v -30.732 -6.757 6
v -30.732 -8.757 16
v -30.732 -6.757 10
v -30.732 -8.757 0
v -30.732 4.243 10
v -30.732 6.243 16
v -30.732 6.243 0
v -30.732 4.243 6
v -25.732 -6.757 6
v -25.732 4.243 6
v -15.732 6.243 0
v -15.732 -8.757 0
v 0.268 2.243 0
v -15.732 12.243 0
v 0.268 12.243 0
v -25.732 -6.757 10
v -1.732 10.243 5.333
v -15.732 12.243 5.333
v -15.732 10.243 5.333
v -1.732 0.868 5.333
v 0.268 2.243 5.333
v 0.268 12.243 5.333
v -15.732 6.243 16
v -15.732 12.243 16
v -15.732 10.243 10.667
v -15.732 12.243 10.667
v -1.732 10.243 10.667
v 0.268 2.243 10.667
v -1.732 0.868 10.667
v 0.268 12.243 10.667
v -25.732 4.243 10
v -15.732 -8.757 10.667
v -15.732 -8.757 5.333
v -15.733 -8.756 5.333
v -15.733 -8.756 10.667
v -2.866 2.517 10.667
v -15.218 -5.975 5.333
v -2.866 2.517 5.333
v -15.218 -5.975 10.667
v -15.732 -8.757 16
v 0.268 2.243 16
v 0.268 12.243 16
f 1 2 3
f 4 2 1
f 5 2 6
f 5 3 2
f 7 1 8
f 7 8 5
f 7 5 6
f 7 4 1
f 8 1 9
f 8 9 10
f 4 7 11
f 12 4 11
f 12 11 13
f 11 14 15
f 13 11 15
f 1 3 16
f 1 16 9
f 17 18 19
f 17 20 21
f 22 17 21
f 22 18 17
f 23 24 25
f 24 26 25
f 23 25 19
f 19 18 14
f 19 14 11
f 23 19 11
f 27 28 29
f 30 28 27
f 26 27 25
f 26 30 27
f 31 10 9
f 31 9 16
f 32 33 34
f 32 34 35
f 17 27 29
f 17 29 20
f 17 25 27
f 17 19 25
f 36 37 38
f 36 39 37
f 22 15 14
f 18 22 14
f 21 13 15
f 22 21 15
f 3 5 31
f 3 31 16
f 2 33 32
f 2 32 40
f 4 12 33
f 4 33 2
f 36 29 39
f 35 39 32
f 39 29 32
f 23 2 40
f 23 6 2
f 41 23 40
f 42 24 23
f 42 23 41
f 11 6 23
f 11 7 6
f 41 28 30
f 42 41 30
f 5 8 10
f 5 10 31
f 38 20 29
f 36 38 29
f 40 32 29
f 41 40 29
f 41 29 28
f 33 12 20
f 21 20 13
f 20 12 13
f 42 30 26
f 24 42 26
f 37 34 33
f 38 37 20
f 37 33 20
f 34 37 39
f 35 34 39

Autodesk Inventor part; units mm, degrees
ref_plane "YZ Plane" through (0, 0, 0) normal (1, 0, 0) x (0, 1, 0)
ref_plane "XZ Plane" through (0, 0, 0) normal (0, 1, 0) x (-1, 0, 0)
ref_plane "XY Plane" through (0, 0, 0) normal (0, 0, 1) x (1, 0, 0)
sketch "Sketch1" plane through (0, 0, 0) normal (0, 0, 1) x (1, 0, 0)
  line L0 (-30.7315, 6.2426) -> (-15.7315, 6.2426)
  line L1 (-15.7315, 6.2426) -> (-15.7315, -8.7574)
  line L2 (-15.7315, -8.7574) -> (-30.7315, -8.7574)
  line L3 (-30.7315, -8.7574) -> (-30.7315, 6.2426)
  line L4 (0.2685, 2.2426) -> (0.2685, 12.2426)
  line L5 (0.2685, 12.2426) -> (-15.7315, 12.2426)
  line L6 (-15.7315, 12.2426) -> (-15.7315, 6.2426)
  line L7 (-15.7315, -8.7574) -> (0.2685, 2.2426)
  point P0 (0, 0)
  dimension "d0" = 15
  dimension "d1" = 15
  dimension "d2" = 6
  dimension "d3" = 16
  dimension "d4" = 10
extrude "Extrusion1" add sketch "Sketch1" along normal blind 16
sketch "Sketch2" plane through (-15.7315, 12.2426, 0) normal (0, 1, 0) x (1, 0, 0)
  line L0 (16, 0) -> (16, -16) projected
  line L1 (0, -5.3333) -> (16, -5.3333)
  line L2 (16, -5.3333) -> (16, -10.6667)
  line L3 (16, -10.6667) -> (0, -10.6667)
  line L4 (0, -10.6667) -> (0, -5.3333)
  line L5 (0, 0) -> (0, -16) projected
  line L6 (16, 0) -> (0, 0) projected
  line L7 (16, -16) -> (0, -16) projected
  point P0 (15.7315, 0)
  dimension "d7" = 16
  dimension "d8" = 5.3333
  dimension "d9" = 5.3333
extrude "Extrusion2" cut sketch "Sketch2" against normal blind 2 contours L0 L3 L4 L1
sketch "Sketch3" plane through (0.2685, 2.2426, 0) normal (1, 0, 0) x (0, 0, -1)
  line L0 (-10.6667, 8) -> (-10.6667, 10) projected
  line L1 (-10.6667, 10) -> (-16, 10) projected
  line L2 (-16, 0) -> (-16, 10) projected
  line L3 (0, 0) -> (-16, 0) projected
  line L4 (0, 0) -> (0, 10) projected
  line L5 (0, 10) -> (-5.3333, 10) projected
  line L6 (-5.3333, 10) -> (-5.3333, 8) projected
  line L7 (-5.3333, 8) -> (-10.6667, 8) projected
  line L8 (0, 0) -> (-16, 0) projected
  line L9 (-10.6667, 8) -> (-5.3333, 8)
  line L10 (-10.6667, 8) -> (-10.6667, -2)
  line L11 (-10.6667, -2) -> (-5.3333, -2)
  line L12 (-5.3333, -2) -> (-5.3333, 8)
  point P0 (0, -2.2426)
  dimension "d14" = 10
  dimension "d15" = 10
extrude "Extrusion3" cut sketch "Sketch3" against normal blind 2 contours L7 L12 L3 L10 | L3 L12 L11 L10
sketch "Sketch4" plane through (-15.7315, -8.7574, 0) normal (0.5665, -0.824, 0) x (0.824, 0.5665, 0)
  line L0 (16.9894, 10.6667) -> (19.4165, 10.6667) projected
  line L1 (19.4165, 10.6667) -> (19.4165, 16) projected
  line L2 (0, 16) -> (19.4165, 16) projected
  line L3 (0, 0) -> (0, 16) projected
  line L4 (0, 0) -> (19.4165, 0) projected
  line L5 (19.4165, 0) -> (19.4165, 5.3333) projected
  line L6 (19.4165, 5.3333) -> (16.9894, 5.3333) projected
  line L7 (16.9894, 5.3333) -> (16.9894, 10.6667) projected
  line L8 (16.9894, 10.6667) -> (19.4165, 10.6667) projected
  line L9 (16.9894, 10.6667) -> (0, 10.6667)
  line L10 (0, 10.6667) -> (0, 5.3333)
  line L11 (0, 5.3333) -> (16.9894, 5.3333)
  line L12 (16.9894, 5.3333) -> (16.9894, 10.6667)
  point P0 (17.9247, 0)
  dimension "d17" = 19.4165
extrude "Extrusion4" cut sketch "Sketch4" against normal blind 2 contours L7 L11 L3 L9
chamfer "Chamfer1" distance 2 angle 45 1 edges at (-16.8645, -7.1093, 8)
sketch "Sketch5" plane through (-30.7315, -8.7574, 0) normal (-1, 0, 0) x (0, 0, 1)
  line L0 (6, 13) -> (10, 13)
  line L1 (10, 13) -> (10, 2)
  line L2 (10, 2) -> (6, 2)
  line L3 (6, 2) -> (6, 13)
  line L4 (0, 15) -> (0, 0) projected
  line L5 (0, 0) -> (16, 0) projected
  line L6 (16, 15) -> (16, 0) projected
  line L7 (0, 15) -> (16, 15) projected
  point P0 (0, 8.7574)
  dimension "d23" = 4
  dimension "d24" = 11
  dimension "d25" = 6
  dimension "d26" = 15
  dimension "d27" = 16
  dimension "d28" = 2
extrude "Extrusion5" cut sketch "Sketch5" against normal blind 5 contours L0 L1 L2 L3
equation "\"d8\" = 0.333333 * d7"
equation "\"d9\" = -2 * d8 + d7"
equation "\"d14\" = d15"
equation "\"d25\" = -0.5 * d23 + 0.5 * d27"
equation "\"d28\" = -0.5 * d24 + 0.5 * d26"
properties part number "under walle L3"
